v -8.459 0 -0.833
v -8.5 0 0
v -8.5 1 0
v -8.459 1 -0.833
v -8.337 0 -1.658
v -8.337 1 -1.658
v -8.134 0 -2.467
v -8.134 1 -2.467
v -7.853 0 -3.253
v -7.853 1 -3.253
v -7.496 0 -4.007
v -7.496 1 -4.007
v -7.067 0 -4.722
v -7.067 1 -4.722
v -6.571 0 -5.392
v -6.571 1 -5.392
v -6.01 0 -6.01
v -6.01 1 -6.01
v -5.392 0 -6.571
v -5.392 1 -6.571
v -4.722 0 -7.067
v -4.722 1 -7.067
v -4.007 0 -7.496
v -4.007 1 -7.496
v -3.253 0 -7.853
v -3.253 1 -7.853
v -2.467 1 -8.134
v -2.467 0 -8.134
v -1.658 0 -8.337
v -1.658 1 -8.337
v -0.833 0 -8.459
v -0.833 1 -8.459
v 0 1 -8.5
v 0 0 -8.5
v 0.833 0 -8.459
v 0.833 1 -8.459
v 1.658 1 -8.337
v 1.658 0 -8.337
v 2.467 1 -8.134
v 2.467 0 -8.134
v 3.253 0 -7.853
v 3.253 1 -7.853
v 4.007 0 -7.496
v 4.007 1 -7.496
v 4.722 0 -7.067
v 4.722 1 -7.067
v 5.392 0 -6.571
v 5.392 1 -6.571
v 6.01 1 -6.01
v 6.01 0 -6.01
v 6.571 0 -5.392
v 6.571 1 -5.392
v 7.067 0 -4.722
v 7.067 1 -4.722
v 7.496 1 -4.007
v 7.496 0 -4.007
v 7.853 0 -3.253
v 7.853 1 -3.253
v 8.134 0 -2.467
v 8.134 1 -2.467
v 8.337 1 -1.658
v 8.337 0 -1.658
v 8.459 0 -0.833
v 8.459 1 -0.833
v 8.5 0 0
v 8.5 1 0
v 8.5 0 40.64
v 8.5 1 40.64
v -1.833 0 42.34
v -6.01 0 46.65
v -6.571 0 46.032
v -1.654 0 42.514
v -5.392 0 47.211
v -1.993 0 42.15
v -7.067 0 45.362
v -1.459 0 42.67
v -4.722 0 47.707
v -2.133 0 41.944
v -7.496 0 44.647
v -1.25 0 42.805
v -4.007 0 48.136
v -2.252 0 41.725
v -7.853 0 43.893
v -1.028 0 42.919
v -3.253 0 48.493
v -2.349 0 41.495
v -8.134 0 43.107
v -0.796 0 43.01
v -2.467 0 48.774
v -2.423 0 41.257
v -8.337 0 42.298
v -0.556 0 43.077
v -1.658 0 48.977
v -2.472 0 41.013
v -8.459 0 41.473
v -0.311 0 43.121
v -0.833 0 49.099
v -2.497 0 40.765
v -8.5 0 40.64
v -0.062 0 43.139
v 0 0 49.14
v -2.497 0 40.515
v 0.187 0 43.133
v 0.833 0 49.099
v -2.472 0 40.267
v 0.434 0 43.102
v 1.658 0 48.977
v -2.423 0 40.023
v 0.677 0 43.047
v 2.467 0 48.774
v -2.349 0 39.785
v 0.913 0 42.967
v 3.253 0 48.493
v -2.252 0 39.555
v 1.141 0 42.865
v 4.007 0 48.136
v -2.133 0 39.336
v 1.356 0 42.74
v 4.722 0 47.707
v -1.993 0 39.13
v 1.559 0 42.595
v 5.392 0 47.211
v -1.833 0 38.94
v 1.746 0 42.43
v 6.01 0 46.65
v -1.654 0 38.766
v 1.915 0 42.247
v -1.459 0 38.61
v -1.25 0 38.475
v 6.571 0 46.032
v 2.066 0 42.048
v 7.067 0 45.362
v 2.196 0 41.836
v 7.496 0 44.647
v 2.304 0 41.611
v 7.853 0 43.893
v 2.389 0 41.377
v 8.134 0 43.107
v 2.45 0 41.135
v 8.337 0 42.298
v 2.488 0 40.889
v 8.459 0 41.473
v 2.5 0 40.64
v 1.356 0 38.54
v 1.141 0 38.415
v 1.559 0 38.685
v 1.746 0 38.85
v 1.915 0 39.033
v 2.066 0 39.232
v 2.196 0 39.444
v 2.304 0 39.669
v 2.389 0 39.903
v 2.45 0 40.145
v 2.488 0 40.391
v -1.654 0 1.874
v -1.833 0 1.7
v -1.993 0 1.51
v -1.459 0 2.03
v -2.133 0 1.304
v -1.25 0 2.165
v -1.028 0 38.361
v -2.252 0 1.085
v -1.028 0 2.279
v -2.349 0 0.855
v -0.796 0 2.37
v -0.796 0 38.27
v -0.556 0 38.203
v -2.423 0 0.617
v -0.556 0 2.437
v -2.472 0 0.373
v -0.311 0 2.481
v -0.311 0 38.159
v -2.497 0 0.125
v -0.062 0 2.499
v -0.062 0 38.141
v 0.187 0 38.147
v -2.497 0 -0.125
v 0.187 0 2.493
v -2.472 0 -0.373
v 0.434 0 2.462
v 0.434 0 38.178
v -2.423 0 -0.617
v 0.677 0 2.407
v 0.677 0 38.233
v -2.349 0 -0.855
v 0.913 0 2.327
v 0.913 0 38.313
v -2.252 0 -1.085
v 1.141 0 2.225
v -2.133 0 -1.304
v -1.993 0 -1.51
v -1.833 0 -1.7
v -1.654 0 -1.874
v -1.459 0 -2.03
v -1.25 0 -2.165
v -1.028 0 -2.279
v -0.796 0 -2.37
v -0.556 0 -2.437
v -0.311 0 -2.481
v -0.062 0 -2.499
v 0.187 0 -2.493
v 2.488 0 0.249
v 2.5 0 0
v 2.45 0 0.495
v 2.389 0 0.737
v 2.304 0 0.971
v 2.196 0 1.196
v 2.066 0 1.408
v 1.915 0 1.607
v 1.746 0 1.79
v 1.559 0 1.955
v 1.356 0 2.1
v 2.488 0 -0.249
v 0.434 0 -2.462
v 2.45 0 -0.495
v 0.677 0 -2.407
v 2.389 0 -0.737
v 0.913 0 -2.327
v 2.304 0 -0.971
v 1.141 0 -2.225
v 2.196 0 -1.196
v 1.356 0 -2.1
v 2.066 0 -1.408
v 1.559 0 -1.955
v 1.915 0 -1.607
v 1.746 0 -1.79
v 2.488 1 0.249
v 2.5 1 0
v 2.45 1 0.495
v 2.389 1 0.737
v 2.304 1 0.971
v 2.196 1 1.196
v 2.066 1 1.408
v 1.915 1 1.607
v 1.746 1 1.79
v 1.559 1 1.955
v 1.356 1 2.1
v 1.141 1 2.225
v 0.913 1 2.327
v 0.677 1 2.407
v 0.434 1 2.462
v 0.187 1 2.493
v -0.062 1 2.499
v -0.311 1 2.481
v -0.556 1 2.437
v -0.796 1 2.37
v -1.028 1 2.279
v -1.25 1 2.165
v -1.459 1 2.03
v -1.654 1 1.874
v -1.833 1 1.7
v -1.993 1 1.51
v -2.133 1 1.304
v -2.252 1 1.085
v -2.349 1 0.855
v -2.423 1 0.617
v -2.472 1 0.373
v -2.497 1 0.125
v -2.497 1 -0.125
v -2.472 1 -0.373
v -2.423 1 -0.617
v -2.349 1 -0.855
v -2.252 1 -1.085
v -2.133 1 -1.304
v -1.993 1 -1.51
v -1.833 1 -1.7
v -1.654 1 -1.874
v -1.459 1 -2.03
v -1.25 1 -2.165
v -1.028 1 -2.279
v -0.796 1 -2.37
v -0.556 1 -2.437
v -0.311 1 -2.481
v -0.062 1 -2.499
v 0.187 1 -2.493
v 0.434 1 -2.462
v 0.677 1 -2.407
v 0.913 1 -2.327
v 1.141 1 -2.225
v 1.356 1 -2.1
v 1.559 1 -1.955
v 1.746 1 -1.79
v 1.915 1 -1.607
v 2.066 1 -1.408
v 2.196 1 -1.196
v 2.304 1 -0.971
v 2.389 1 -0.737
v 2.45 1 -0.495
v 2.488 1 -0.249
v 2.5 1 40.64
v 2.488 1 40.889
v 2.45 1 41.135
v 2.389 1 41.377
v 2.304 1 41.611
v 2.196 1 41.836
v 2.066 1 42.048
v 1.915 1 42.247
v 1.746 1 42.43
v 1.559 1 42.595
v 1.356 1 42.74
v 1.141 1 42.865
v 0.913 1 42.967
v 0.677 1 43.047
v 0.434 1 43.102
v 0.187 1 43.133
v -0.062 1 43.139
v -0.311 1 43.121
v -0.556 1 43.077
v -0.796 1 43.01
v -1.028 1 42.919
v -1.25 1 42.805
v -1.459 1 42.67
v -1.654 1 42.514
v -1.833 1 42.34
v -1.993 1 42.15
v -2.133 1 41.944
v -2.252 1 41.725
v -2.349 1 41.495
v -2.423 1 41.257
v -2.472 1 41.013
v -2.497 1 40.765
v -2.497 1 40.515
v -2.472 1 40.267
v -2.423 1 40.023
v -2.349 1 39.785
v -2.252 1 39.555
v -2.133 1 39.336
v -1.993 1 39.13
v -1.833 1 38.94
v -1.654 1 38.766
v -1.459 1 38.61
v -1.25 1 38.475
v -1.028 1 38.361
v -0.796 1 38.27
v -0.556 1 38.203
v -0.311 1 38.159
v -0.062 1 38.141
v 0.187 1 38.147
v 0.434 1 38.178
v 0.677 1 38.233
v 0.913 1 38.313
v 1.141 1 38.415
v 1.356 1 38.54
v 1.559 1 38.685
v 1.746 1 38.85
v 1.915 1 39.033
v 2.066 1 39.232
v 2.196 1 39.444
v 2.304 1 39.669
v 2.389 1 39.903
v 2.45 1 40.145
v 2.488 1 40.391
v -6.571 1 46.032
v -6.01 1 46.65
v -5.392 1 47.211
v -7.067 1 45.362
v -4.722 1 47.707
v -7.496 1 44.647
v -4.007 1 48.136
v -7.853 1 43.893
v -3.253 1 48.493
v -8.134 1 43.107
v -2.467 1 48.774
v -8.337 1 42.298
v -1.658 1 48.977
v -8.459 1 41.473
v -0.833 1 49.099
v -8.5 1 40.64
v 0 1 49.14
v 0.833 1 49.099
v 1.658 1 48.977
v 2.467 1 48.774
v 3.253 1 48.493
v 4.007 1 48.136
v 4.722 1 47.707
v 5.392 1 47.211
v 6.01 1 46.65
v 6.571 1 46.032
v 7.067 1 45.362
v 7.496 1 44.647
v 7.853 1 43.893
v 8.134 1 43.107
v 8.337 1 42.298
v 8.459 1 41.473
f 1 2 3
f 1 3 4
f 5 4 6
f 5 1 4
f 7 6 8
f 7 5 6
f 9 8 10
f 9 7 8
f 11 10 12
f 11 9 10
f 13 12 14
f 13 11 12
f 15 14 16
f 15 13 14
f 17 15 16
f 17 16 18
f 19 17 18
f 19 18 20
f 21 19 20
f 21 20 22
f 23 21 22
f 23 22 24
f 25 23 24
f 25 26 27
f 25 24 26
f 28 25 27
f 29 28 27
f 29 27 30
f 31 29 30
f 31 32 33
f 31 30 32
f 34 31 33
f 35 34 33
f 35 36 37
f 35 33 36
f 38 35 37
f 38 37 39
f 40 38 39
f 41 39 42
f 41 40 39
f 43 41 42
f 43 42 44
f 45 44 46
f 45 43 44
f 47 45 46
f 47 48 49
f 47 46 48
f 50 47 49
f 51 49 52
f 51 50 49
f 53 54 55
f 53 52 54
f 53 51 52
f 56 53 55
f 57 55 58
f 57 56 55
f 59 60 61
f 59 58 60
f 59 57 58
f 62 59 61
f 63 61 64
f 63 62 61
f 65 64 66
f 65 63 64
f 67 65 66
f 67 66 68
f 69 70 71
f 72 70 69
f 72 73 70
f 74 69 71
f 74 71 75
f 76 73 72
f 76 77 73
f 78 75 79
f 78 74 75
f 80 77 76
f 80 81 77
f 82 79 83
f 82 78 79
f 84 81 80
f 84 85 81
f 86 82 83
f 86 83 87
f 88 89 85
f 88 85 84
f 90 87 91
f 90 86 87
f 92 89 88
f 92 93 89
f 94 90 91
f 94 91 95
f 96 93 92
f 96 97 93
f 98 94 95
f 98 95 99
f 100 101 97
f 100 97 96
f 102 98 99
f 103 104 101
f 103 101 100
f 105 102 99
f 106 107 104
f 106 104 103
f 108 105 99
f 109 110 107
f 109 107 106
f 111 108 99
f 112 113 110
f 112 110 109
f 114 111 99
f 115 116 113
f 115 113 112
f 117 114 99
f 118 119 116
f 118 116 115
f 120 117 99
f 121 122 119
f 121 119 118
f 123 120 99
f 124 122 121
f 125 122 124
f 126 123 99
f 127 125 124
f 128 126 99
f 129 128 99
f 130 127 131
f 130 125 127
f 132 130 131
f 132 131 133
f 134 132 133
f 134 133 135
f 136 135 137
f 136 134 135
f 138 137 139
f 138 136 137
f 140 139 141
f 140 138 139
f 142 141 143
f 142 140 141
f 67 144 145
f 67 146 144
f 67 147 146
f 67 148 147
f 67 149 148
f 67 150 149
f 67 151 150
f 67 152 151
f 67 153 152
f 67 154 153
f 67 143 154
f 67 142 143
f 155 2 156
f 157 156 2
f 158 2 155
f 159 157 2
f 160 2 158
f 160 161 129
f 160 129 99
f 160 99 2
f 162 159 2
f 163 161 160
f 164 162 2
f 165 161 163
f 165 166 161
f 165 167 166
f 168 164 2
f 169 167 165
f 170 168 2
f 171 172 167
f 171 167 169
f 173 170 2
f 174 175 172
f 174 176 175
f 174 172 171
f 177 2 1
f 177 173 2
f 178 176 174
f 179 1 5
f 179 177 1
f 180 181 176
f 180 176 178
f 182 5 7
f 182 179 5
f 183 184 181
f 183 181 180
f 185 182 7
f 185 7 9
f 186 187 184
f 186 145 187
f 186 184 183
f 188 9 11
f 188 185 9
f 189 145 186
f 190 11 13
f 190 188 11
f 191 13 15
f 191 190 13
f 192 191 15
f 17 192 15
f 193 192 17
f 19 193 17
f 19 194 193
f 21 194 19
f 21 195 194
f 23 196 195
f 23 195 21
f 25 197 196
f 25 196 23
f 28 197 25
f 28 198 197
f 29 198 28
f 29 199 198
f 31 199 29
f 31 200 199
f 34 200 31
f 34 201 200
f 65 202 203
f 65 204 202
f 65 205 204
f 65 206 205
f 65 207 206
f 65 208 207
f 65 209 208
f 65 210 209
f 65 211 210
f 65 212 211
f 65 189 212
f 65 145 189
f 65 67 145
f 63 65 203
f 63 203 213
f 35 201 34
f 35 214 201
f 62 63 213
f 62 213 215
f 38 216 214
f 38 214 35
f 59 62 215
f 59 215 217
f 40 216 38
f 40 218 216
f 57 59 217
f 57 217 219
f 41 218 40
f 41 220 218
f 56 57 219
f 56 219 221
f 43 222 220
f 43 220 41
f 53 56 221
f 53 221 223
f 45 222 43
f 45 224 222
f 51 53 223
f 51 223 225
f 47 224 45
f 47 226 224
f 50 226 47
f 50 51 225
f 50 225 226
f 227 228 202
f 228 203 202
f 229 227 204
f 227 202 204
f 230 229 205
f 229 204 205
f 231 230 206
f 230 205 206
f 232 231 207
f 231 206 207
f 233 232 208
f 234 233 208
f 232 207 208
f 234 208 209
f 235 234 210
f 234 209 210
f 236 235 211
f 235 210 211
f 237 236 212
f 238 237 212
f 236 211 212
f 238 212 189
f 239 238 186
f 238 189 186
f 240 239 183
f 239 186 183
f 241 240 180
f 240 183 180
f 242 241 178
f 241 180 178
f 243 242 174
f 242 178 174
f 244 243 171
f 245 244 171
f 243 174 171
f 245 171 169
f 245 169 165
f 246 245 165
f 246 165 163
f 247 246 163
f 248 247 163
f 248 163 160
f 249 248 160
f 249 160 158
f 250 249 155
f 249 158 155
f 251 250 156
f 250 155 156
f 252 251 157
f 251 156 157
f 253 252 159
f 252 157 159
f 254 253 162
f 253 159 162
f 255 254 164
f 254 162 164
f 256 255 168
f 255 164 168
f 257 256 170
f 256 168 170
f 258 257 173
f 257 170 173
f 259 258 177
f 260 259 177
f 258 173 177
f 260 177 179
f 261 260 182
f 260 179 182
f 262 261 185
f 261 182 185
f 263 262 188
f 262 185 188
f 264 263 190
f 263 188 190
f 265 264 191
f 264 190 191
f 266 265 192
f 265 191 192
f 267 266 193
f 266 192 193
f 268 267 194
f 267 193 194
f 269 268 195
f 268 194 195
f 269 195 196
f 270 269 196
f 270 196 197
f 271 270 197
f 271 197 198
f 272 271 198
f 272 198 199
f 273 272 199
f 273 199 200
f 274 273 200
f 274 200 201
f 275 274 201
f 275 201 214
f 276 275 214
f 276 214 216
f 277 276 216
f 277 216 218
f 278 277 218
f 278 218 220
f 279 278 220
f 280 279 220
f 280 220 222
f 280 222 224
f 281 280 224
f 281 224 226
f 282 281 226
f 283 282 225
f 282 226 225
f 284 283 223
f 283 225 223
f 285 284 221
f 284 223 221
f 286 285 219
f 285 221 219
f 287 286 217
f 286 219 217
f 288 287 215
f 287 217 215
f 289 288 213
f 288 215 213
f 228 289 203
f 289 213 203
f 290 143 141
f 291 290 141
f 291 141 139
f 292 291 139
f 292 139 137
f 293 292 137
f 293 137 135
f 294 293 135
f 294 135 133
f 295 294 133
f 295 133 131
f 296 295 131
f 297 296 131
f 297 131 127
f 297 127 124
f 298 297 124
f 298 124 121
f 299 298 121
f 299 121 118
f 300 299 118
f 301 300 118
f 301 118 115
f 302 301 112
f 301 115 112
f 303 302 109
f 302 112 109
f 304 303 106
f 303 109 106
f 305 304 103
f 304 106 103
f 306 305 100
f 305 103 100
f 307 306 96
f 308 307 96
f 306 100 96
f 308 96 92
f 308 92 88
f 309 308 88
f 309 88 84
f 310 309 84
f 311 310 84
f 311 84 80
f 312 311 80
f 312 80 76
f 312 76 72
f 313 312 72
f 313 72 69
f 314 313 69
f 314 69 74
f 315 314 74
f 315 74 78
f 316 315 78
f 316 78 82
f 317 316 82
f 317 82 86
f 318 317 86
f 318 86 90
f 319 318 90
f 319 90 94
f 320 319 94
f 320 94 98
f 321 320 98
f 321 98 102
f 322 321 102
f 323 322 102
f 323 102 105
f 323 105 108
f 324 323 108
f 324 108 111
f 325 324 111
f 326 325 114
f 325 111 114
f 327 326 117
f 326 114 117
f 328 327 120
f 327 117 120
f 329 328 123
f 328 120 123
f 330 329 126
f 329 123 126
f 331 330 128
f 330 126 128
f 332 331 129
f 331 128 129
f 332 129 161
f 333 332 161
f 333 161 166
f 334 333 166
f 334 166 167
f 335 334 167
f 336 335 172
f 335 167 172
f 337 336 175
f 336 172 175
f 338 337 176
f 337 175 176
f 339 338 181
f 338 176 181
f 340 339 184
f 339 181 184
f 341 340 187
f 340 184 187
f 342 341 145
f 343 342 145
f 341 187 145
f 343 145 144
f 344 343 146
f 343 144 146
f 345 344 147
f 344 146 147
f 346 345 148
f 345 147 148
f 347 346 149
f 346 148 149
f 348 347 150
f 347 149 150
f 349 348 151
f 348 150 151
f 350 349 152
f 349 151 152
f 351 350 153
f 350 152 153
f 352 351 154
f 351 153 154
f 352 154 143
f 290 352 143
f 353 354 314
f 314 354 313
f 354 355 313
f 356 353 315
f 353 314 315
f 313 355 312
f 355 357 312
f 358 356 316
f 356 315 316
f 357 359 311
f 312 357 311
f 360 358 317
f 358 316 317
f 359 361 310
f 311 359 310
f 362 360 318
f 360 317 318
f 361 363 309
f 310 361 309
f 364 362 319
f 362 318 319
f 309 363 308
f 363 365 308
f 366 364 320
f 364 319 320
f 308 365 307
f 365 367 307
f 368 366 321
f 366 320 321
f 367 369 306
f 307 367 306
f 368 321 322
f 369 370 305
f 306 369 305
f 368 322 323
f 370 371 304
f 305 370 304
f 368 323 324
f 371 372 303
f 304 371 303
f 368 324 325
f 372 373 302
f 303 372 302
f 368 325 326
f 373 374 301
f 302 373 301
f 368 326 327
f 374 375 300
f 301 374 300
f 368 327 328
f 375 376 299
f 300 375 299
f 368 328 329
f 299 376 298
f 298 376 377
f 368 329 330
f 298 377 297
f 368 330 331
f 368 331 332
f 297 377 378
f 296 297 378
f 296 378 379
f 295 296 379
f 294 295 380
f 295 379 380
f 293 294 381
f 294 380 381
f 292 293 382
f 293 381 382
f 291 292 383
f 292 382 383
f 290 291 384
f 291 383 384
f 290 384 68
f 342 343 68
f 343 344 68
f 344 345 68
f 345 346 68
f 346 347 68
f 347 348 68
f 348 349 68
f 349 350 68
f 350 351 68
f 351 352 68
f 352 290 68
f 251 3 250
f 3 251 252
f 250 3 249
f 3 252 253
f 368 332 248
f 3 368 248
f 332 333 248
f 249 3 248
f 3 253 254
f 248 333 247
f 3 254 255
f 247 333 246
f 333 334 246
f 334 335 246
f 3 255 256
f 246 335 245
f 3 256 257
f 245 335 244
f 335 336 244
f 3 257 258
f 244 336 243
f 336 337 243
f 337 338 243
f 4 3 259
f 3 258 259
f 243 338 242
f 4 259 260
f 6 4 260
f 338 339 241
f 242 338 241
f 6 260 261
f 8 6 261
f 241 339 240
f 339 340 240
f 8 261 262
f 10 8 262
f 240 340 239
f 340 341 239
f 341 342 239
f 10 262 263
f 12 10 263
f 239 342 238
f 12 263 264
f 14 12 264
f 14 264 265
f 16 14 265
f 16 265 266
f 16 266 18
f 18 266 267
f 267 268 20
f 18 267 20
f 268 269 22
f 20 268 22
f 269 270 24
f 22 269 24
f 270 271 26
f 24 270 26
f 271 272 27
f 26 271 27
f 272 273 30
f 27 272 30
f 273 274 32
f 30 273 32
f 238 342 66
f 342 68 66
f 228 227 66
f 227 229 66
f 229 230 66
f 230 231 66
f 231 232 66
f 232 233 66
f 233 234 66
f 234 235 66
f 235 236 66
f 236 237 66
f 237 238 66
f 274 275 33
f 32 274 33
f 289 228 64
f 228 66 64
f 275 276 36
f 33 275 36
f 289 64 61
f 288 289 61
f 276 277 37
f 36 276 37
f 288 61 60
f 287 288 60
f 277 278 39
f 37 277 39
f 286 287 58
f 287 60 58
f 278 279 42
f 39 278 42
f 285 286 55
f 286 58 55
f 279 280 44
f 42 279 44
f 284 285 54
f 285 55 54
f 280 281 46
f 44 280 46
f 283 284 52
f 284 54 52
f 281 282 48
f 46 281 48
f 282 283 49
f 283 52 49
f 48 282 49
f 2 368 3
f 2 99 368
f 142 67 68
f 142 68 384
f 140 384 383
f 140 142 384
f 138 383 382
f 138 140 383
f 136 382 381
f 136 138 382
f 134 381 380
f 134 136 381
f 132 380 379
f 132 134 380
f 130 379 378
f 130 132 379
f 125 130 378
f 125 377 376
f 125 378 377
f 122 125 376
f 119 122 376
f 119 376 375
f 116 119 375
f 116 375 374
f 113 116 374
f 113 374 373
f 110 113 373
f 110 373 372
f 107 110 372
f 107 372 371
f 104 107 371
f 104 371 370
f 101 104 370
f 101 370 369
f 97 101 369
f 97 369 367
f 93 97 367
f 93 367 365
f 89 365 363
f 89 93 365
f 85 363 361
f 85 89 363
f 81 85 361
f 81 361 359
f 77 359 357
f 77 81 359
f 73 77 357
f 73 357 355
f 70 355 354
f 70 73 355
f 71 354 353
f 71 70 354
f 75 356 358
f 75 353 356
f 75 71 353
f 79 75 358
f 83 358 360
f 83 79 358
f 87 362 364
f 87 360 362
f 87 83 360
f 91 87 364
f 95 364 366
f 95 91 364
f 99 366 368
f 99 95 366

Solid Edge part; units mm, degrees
sketch "Sketch1" plane through (0, 0, 0) normal (0, -1, 0) x (1, 0, 0)
  line L0 (8.5, 0) -> (8.5, 40.64)
  line L1 (-8.5, 40.64) -> (-8.5, 0)
  arc A0 (-8.5, 40.64) -> (8.5, 40.64) centre (0, 40.64) cw
  arc A1 (8.5, 0) -> (-8.5, 0) centre (0, 0) cw
  circle A2 centre (0, 40.64) radius 2.5
  circle A3 centre (0, 0) radius 2.5
extrude "Protrusion1" add sketch "Sketch1" against normal blind 1
